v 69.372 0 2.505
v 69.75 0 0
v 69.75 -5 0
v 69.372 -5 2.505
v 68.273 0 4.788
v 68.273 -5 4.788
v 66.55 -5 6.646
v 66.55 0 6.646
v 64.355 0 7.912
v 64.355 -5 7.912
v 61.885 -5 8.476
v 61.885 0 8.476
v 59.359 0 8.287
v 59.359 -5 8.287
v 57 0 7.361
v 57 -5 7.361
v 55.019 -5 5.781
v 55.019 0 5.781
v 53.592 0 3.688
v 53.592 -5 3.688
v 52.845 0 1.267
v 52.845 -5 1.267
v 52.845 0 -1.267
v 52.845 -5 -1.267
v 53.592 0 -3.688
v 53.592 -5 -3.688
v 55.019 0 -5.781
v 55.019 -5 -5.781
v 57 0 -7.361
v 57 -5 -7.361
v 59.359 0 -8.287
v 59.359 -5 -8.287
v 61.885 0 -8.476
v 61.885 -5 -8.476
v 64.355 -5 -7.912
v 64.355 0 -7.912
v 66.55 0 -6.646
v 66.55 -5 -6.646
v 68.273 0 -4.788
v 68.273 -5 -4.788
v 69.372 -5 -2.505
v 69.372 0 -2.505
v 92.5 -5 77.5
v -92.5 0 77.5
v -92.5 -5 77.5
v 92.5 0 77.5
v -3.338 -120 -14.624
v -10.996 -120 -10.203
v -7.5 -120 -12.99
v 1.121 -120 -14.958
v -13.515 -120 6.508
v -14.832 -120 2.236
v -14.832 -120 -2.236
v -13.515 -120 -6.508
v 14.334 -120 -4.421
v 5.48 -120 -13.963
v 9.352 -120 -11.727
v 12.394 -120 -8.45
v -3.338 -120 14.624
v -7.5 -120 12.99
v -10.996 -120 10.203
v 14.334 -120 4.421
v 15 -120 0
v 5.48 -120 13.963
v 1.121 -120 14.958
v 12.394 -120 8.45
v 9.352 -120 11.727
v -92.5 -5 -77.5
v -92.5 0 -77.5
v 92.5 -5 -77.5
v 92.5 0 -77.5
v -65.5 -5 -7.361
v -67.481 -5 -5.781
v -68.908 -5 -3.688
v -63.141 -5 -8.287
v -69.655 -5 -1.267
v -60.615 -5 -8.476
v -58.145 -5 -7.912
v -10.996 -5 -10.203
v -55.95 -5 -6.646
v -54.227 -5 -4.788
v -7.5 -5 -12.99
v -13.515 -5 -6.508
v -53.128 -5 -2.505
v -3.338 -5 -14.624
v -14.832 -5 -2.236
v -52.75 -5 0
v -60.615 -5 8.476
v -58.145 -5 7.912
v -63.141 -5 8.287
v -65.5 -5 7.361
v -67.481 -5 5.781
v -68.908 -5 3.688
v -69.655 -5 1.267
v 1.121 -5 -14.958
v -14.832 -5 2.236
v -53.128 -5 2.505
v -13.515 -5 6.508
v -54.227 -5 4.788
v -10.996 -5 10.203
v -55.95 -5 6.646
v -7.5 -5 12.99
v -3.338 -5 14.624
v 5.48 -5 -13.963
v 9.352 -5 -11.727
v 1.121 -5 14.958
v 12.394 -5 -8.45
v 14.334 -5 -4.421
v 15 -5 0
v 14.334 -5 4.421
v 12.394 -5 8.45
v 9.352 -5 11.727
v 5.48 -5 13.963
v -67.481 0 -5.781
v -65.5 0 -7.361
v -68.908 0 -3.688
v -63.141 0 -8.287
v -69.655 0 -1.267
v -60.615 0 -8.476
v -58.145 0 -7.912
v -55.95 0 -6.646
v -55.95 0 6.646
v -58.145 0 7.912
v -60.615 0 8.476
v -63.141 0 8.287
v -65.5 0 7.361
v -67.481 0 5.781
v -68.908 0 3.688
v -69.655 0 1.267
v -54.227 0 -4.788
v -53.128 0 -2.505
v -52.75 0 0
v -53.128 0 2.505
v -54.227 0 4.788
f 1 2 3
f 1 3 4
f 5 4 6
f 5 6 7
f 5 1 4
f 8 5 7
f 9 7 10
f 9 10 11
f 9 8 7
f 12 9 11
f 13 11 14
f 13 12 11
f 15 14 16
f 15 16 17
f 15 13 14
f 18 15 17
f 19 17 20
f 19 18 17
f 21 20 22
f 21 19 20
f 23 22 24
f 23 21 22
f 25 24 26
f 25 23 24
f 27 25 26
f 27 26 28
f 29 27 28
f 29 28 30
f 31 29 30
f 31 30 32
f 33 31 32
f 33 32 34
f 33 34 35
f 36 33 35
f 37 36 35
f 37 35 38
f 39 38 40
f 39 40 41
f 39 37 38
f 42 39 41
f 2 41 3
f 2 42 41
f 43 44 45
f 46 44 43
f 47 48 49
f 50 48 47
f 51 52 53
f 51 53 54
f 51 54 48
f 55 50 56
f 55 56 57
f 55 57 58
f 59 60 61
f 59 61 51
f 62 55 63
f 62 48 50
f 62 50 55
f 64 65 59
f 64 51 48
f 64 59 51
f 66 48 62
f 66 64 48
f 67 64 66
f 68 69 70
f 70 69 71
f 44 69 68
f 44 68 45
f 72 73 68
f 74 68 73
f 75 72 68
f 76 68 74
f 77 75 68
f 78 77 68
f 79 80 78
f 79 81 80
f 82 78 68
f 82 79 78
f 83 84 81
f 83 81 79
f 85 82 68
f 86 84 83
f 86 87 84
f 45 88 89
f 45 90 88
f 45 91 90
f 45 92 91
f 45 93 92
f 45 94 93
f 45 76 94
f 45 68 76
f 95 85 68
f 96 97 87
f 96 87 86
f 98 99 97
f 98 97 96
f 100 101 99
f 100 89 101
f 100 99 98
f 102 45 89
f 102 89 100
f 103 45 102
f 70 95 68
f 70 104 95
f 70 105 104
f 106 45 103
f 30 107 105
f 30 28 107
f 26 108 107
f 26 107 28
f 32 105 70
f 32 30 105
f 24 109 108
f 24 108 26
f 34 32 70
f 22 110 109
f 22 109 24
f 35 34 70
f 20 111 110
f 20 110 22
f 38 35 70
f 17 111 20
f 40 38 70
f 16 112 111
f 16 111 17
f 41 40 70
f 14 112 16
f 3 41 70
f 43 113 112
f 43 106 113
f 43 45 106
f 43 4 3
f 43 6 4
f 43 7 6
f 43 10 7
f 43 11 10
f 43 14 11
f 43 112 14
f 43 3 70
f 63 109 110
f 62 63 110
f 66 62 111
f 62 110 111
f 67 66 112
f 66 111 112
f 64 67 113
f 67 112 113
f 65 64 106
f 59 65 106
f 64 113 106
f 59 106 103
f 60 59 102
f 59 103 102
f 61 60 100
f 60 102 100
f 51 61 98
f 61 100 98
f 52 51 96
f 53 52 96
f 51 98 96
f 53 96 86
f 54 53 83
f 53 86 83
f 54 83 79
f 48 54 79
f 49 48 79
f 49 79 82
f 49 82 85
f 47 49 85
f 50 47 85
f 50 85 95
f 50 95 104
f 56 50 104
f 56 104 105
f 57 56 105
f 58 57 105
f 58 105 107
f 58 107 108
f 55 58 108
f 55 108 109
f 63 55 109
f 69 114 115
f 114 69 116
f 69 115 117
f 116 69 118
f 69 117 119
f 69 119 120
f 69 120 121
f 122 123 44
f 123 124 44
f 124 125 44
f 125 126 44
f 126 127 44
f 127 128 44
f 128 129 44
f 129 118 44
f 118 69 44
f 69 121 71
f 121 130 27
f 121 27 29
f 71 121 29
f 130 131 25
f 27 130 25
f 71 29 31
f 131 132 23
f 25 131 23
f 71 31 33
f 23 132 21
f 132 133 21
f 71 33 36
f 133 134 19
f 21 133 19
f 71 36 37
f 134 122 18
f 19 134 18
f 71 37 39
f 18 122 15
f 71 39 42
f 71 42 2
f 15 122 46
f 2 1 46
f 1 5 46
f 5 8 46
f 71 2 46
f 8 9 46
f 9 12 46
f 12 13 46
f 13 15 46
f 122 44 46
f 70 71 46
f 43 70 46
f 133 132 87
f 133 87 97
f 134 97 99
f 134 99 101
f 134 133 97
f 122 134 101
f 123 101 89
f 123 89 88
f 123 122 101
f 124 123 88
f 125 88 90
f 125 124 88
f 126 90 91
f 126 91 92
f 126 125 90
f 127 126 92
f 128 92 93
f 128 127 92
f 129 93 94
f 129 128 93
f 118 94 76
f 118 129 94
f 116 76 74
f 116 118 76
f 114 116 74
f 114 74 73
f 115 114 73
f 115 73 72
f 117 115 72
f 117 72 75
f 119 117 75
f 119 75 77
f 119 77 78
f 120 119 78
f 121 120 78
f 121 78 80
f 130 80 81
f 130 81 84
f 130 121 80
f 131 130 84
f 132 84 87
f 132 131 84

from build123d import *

# Parameters (mm, degrees)
F0_R     = 15
F1_DEPTH = 120
F0_W     = 185
F0_H     = 155
F0_R_2   = 8.5
F2_DEPTH = 5


with BuildPart() as f1:
    # F0 (on Front) → F1 (new body)
    with BuildSketch(Plane.XZ):
        Circle(F0_R)
    extrude(amount=F1_DEPTH)

    # F0 (on Front) → F2 (join)
    with BuildSketch(Plane.XZ):
        Rectangle(F0_W, F0_H)
        with Locations((-61.25, 0)):
            Circle(F0_R_2, mode=Mode.SUBTRACT)
        Circle(F0_R, mode=Mode.SUBTRACT)
        with Locations((61.25, 0)):
            Circle(F0_R_2, mode=Mode.SUBTRACT)
    extrude(amount=F2_DEPTH)


solid = f1.part
